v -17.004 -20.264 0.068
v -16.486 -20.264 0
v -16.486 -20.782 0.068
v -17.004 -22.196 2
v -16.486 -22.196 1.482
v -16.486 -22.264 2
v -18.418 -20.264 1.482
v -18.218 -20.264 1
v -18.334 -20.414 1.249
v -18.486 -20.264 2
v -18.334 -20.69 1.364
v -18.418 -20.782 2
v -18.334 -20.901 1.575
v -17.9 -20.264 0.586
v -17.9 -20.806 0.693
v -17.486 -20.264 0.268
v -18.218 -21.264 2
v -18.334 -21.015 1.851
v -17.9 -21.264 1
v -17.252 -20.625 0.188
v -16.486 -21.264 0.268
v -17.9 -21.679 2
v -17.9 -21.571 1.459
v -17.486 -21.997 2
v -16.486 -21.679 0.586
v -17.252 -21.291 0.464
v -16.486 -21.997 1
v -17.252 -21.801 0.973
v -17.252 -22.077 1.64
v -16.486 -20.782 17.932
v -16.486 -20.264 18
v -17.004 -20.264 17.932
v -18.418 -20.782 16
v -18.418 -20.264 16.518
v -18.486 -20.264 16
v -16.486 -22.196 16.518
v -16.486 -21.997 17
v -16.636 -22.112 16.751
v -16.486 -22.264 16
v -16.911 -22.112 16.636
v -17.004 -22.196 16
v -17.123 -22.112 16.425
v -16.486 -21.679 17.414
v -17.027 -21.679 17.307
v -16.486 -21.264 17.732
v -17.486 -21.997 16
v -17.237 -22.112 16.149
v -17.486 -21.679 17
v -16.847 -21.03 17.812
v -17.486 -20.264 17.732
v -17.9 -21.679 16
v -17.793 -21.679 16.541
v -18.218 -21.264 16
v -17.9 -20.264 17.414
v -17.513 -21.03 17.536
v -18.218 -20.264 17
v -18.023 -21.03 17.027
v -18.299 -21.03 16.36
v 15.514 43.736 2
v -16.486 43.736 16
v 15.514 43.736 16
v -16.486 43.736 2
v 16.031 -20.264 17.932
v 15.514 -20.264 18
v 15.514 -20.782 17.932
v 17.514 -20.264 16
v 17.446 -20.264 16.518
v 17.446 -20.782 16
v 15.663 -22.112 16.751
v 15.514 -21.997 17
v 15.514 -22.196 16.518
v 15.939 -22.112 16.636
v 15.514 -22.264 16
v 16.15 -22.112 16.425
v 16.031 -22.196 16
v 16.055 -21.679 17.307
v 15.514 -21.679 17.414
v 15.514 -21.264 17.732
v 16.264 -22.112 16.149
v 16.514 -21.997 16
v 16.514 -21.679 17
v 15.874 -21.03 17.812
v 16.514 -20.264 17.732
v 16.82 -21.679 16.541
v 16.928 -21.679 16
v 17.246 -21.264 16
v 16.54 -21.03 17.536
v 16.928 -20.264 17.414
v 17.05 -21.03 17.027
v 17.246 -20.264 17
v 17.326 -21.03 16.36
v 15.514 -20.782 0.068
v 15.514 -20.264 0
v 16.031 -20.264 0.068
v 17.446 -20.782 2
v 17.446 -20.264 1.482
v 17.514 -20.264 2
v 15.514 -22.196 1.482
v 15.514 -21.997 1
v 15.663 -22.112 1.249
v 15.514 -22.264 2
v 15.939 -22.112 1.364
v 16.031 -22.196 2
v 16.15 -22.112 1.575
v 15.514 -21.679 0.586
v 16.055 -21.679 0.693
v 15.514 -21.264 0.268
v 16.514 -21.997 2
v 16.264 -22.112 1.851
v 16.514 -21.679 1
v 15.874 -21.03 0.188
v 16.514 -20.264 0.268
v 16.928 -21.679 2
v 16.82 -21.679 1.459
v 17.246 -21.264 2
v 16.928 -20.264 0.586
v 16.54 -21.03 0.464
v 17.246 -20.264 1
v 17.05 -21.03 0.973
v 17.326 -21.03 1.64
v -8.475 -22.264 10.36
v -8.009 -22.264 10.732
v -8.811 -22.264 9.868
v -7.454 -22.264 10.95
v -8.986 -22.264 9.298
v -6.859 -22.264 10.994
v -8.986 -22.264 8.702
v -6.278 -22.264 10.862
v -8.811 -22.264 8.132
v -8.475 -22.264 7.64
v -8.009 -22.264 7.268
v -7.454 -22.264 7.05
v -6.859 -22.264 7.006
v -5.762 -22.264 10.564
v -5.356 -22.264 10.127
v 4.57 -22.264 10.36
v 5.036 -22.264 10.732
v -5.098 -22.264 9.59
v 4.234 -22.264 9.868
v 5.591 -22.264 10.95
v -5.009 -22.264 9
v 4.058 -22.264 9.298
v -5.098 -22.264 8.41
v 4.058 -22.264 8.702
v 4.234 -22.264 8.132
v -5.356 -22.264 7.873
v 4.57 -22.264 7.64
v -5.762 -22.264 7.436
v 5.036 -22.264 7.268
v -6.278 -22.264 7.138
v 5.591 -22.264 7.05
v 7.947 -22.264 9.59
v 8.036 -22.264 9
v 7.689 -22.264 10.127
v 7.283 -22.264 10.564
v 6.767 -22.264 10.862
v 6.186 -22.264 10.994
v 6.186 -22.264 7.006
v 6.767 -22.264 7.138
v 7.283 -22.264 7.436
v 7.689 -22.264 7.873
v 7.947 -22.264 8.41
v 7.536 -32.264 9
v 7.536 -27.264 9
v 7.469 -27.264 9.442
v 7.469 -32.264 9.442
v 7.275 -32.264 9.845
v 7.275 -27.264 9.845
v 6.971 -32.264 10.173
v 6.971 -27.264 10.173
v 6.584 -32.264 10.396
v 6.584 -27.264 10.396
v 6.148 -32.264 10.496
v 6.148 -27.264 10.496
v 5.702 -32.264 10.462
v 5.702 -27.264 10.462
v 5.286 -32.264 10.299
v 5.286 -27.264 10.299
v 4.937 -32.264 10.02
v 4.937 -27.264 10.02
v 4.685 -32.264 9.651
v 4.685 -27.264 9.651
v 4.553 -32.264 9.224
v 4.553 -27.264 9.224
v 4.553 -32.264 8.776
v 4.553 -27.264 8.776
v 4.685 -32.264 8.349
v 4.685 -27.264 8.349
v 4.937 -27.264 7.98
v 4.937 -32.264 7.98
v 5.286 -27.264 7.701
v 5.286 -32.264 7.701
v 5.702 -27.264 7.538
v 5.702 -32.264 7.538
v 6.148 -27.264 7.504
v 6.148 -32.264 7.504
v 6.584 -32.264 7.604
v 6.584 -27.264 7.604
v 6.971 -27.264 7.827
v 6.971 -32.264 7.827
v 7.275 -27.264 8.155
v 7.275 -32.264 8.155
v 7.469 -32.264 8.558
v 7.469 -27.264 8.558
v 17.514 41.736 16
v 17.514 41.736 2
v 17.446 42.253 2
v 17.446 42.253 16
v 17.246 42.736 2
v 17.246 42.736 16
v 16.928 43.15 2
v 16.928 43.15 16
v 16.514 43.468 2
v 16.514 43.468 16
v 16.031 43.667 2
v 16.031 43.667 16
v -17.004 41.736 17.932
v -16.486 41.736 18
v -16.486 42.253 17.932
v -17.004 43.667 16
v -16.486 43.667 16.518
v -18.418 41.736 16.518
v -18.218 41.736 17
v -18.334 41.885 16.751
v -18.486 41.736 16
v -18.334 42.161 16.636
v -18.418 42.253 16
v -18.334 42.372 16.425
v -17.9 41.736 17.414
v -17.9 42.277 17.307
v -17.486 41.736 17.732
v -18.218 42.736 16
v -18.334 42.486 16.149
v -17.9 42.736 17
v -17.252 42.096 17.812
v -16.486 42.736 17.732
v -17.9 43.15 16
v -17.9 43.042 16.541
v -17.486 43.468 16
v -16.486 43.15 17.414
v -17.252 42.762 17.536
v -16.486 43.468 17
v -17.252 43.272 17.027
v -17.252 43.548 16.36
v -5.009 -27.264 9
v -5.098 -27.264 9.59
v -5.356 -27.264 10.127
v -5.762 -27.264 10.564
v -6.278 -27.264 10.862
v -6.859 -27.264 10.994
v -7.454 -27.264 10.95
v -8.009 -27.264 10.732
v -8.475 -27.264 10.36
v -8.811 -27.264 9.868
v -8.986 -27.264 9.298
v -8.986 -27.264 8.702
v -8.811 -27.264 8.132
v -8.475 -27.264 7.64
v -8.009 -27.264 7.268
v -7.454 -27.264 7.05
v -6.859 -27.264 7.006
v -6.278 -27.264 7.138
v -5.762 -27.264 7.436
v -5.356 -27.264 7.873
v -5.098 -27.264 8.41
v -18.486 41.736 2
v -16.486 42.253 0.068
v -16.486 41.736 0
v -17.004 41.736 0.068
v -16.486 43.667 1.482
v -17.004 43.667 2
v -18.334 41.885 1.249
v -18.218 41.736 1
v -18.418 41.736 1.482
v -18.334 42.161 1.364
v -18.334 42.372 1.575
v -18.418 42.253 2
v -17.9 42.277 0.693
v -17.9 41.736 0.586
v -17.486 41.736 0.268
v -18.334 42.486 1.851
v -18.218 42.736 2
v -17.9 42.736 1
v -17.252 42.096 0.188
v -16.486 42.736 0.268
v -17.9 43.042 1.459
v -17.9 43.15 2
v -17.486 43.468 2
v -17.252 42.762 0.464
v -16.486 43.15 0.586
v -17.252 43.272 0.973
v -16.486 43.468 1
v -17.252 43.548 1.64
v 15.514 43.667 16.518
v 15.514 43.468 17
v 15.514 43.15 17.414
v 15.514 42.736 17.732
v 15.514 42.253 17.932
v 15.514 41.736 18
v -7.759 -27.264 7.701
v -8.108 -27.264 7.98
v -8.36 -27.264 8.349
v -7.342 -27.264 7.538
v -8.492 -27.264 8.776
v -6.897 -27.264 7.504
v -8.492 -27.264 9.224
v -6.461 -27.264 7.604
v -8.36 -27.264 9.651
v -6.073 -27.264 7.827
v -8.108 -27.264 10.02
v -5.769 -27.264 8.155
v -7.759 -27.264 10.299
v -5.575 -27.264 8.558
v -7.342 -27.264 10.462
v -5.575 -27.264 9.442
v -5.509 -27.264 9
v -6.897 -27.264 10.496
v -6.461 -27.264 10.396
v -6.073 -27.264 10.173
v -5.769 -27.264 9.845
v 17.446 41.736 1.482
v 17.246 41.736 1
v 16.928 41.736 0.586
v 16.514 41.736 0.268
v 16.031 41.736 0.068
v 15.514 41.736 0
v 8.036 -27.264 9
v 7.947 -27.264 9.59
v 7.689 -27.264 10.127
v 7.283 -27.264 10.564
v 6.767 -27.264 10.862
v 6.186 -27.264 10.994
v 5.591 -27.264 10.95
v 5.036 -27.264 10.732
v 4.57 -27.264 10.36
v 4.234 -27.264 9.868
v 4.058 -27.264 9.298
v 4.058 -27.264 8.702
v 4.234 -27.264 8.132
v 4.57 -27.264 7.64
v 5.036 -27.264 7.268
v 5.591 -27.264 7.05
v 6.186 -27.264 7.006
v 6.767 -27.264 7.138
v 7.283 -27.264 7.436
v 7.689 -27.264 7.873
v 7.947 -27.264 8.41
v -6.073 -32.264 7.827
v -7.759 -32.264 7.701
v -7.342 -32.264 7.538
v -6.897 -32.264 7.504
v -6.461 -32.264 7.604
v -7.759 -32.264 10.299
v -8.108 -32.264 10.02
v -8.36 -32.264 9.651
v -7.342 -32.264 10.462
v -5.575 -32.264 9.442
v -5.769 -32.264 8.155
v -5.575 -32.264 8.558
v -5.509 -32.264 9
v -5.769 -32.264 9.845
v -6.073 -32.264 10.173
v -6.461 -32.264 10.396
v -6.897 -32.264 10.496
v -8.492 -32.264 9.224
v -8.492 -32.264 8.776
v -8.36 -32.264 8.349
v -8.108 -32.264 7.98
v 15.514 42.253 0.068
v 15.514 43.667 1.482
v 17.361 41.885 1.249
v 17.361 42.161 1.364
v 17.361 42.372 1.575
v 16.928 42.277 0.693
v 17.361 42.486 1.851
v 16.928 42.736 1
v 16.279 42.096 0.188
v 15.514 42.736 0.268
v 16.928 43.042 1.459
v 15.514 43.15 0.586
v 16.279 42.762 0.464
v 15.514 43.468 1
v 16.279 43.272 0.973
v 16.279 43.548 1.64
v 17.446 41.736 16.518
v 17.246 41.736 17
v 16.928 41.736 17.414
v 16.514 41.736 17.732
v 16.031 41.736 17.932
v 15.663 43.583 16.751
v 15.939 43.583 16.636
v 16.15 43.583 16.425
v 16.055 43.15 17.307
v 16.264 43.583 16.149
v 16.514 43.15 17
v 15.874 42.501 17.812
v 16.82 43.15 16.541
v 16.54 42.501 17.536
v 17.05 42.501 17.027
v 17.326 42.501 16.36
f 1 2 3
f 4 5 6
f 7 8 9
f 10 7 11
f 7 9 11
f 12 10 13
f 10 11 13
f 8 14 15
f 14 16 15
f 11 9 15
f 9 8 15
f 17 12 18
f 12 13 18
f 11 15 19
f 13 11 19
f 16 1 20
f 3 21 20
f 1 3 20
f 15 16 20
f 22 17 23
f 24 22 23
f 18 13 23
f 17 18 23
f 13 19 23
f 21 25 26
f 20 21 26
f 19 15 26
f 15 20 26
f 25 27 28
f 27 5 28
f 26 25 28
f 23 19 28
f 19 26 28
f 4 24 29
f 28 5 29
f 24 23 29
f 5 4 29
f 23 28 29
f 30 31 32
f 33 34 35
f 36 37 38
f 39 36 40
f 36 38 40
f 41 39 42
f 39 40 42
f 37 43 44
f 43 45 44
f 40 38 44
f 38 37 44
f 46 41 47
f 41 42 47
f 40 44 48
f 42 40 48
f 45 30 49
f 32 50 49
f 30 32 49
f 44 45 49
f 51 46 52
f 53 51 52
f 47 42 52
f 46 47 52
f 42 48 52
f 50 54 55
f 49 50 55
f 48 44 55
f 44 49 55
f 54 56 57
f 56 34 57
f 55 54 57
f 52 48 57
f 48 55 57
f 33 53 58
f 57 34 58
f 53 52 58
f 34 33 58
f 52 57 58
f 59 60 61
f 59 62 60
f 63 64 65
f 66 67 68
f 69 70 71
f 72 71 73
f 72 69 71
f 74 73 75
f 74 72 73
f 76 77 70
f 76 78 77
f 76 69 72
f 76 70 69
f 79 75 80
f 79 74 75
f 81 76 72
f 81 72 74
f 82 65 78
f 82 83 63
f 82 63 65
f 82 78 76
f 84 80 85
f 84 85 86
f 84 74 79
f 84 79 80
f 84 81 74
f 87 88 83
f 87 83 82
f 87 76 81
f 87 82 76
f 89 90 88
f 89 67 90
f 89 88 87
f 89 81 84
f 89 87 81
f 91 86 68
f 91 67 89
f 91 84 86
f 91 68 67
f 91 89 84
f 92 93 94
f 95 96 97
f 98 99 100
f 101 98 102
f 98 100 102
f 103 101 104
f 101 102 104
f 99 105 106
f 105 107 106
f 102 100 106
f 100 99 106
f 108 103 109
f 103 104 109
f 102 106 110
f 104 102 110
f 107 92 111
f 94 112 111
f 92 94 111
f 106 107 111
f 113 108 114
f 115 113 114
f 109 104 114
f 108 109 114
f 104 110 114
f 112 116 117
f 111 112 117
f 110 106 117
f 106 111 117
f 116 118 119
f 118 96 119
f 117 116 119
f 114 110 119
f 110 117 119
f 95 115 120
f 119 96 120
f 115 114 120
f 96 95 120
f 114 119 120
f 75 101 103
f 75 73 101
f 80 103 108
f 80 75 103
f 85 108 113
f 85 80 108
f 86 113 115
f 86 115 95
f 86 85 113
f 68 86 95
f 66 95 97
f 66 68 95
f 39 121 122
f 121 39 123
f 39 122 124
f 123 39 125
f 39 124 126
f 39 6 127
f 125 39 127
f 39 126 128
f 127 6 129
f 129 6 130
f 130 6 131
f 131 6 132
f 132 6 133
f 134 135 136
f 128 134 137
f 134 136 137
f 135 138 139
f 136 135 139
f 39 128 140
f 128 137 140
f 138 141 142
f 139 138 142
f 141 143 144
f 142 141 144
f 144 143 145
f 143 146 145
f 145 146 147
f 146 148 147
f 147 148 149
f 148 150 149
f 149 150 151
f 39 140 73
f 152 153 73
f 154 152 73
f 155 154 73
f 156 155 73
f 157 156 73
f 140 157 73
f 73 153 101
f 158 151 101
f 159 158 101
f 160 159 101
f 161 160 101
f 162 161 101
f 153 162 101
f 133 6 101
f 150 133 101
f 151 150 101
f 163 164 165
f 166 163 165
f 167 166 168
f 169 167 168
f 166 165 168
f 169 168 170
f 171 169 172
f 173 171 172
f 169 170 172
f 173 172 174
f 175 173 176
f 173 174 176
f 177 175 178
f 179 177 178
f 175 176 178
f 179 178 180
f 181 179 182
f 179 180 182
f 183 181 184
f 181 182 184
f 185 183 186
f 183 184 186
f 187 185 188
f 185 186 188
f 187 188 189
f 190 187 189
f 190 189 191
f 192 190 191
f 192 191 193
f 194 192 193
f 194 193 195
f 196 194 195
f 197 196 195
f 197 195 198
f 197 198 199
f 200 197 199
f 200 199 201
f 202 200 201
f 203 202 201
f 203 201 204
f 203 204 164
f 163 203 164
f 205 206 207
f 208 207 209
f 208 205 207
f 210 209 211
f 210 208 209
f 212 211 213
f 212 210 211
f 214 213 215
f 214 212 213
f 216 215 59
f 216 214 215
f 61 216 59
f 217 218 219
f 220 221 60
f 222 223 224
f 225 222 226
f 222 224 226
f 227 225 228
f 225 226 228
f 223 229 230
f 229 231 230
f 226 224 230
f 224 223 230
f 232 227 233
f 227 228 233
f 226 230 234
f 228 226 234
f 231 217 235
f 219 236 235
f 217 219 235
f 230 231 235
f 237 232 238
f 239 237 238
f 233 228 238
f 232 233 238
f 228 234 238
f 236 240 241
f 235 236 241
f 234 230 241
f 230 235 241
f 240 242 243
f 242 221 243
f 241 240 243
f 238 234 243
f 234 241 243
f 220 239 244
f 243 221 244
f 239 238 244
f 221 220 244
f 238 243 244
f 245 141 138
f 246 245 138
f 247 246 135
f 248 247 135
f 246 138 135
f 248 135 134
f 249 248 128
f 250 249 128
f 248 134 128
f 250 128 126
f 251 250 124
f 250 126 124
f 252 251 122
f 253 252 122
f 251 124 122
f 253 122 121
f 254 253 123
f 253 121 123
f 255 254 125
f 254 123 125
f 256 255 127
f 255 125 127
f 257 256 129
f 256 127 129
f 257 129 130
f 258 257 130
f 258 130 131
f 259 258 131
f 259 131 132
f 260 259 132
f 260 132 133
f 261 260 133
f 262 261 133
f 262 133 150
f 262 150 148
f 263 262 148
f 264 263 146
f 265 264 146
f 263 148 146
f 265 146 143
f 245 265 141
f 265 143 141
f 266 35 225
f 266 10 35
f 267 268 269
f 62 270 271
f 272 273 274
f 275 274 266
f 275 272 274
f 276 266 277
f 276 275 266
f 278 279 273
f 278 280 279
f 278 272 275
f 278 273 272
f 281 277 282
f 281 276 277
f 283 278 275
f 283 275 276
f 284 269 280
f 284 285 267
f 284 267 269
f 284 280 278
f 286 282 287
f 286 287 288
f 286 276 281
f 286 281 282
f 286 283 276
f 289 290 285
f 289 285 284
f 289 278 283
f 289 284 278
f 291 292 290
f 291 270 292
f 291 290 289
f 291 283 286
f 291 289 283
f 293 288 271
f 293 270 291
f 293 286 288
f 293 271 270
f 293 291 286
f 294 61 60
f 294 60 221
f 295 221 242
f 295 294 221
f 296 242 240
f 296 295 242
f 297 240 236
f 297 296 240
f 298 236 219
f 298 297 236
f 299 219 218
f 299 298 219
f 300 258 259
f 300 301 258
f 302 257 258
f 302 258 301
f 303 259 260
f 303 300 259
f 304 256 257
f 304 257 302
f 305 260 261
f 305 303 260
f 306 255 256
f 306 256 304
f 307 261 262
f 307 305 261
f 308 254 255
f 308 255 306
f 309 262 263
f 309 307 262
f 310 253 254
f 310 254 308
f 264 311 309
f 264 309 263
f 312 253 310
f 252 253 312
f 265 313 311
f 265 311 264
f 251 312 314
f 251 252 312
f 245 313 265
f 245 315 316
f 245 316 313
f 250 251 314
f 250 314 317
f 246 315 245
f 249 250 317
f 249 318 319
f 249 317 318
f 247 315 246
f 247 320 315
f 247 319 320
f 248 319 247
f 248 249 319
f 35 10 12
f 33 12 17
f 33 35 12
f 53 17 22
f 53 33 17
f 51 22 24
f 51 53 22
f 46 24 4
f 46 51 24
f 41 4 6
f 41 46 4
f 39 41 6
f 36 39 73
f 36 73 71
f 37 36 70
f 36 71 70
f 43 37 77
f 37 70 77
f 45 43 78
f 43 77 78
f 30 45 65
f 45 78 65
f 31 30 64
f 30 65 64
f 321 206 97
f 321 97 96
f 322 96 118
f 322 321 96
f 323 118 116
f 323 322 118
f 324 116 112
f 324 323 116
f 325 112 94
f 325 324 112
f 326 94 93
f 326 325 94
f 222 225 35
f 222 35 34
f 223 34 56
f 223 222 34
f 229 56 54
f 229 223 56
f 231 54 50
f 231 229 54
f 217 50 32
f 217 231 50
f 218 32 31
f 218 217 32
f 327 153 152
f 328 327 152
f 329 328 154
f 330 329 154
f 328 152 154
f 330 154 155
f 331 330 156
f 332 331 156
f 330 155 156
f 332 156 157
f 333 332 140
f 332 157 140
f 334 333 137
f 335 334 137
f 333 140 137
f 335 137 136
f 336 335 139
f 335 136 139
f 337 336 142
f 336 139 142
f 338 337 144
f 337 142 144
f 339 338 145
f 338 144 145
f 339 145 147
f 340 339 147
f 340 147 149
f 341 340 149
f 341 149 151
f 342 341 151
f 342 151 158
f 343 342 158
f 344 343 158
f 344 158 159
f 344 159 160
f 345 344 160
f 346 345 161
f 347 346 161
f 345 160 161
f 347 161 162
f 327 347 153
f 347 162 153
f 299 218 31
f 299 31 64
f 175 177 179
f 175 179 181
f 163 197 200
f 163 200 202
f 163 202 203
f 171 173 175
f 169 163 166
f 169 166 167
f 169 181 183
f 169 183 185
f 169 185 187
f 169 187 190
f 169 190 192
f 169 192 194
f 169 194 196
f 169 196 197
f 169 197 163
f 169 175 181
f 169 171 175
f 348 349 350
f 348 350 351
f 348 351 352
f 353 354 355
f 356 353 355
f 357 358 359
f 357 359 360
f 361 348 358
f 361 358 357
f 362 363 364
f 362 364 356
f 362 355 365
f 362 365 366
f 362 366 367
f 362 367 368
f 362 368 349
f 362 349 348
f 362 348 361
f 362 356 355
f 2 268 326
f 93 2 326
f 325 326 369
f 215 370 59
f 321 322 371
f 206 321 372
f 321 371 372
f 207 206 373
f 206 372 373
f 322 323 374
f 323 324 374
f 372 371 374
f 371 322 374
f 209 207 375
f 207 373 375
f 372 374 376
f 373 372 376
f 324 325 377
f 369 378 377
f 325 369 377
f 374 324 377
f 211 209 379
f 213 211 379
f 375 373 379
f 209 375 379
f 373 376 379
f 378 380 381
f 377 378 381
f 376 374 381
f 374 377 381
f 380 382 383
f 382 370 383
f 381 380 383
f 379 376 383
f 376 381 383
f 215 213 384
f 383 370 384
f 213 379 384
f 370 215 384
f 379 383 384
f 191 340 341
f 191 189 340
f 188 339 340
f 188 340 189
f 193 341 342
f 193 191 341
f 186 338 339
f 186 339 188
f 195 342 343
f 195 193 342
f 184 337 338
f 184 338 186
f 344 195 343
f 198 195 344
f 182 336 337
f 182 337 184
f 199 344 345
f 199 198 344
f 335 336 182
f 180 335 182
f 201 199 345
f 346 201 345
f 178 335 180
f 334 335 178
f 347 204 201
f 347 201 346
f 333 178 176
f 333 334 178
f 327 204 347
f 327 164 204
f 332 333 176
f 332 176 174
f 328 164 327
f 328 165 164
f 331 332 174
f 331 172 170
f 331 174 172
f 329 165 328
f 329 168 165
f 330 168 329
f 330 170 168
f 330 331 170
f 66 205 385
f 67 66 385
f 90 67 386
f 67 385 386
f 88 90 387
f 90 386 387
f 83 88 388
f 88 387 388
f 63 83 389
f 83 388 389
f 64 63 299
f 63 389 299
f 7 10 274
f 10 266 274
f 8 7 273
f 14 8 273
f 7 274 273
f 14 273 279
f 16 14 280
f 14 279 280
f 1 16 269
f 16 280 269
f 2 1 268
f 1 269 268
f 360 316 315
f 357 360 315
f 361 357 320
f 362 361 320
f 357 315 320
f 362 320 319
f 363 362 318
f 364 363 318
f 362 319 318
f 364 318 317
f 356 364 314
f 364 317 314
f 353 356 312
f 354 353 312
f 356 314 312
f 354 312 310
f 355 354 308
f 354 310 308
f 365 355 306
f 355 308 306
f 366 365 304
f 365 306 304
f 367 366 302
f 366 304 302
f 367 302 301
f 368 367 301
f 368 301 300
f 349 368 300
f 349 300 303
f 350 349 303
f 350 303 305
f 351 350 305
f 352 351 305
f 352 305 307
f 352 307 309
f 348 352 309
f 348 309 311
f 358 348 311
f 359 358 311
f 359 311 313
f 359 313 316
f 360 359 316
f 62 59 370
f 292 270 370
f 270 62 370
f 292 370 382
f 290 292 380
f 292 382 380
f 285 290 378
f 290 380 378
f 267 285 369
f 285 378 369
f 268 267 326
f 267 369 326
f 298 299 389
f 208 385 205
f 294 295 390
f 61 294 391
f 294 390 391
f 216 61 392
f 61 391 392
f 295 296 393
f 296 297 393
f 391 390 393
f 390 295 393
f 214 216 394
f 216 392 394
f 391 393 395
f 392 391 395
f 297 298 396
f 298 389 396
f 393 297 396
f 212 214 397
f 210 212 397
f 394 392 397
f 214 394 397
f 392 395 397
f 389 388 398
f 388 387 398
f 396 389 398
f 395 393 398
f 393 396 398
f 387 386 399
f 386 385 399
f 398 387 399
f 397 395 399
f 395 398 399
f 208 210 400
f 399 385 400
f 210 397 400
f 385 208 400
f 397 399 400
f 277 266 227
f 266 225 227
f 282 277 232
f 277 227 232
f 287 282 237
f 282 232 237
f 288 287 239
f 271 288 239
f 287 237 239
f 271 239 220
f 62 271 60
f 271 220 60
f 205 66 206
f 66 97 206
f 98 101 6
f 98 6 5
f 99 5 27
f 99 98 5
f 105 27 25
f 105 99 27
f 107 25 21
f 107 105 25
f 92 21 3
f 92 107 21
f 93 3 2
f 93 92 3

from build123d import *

# Parameters (mm, degrees)
ESQUISSE1_W        = 36
ESQUISSE1_H        = 66
BOSS_EXTRU_1_DEPTH = 18
CONG_1_R           = 2
ESQUISSE2_R        = 1.5
BOSS_EXTRU_2_DEPTH = 10
ESQUISSE3_R        = 2
ESQUISSE3_R_2      = 1.5
BOSS_EXTRU_3_DEPTH = 5


with BuildPart() as part:
    # Esquisse1 → Boss.-Extru.1 (new body)
    with BuildSketch(Plane.XY):
        with Locations((-0.486264987, 10.73553719)):
            Rectangle(ESQUISSE1_W, ESQUISSE1_H)
    extrude(amount=BOSS_EXTRU_1_DEPTH)

    # Congé1
    cong_1_edges = [part.edges().sort_by_distance(p)[0] for p in [
        (17.513735013, 10.73553719, 18),
        (-0.486264987, 43.73553719, 18),
        (-18.486264987, 10.73553719, 18),
        (-0.486264987, 43.73553719, 0),
        (17.513735013, 10.73553719, 0),
        (-0.486264987, -22.26446281, 0),
        (-18.486264987, 10.73553719, 0),
        (-0.486264987, -22.26446281, 18),
        (-18.486264987, 43.73553719, 9),
        (17.513735013, 43.73553719, 9),
        (17.513735013, -22.26446281, 9),
        (-18.486264987, -22.26446281, 9),
    ]]
    fillet(cong_1_edges, radius=CONG_1_R)

    # Esquisse2 → Boss.-Extru.2 (add)
    with BuildSketch(Plane.XZ.offset(22.26446281)):
        with Locations((-7.00866392, 9)):
            Circle(ESQUISSE2_R)
        with Locations((6.036133945, 9)):
            Circle(ESQUISSE2_R)
    extrude(amount=BOSS_EXTRU_2_DEPTH)

    # Esquisse3 → Boss.-Extru.3 (add)
    with BuildSketch(Plane.XZ.offset(22.26446281)):
        with Locations((-7.00866392, 9)):
            Circle(ESQUISSE3_R)
        with Locations((-7.00866392, 9)):
            Circle(ESQUISSE3_R_2, mode=Mode.SUBTRACT)
        with Locations((6.036133945, 9)):
            Circle(ESQUISSE3_R)
        with Locations((6.036133945, 9)):
            Circle(ESQUISSE3_R_2, mode=Mode.SUBTRACT)
    extrude(amount=BOSS_EXTRU_3_DEPTH)


solid = part.part
